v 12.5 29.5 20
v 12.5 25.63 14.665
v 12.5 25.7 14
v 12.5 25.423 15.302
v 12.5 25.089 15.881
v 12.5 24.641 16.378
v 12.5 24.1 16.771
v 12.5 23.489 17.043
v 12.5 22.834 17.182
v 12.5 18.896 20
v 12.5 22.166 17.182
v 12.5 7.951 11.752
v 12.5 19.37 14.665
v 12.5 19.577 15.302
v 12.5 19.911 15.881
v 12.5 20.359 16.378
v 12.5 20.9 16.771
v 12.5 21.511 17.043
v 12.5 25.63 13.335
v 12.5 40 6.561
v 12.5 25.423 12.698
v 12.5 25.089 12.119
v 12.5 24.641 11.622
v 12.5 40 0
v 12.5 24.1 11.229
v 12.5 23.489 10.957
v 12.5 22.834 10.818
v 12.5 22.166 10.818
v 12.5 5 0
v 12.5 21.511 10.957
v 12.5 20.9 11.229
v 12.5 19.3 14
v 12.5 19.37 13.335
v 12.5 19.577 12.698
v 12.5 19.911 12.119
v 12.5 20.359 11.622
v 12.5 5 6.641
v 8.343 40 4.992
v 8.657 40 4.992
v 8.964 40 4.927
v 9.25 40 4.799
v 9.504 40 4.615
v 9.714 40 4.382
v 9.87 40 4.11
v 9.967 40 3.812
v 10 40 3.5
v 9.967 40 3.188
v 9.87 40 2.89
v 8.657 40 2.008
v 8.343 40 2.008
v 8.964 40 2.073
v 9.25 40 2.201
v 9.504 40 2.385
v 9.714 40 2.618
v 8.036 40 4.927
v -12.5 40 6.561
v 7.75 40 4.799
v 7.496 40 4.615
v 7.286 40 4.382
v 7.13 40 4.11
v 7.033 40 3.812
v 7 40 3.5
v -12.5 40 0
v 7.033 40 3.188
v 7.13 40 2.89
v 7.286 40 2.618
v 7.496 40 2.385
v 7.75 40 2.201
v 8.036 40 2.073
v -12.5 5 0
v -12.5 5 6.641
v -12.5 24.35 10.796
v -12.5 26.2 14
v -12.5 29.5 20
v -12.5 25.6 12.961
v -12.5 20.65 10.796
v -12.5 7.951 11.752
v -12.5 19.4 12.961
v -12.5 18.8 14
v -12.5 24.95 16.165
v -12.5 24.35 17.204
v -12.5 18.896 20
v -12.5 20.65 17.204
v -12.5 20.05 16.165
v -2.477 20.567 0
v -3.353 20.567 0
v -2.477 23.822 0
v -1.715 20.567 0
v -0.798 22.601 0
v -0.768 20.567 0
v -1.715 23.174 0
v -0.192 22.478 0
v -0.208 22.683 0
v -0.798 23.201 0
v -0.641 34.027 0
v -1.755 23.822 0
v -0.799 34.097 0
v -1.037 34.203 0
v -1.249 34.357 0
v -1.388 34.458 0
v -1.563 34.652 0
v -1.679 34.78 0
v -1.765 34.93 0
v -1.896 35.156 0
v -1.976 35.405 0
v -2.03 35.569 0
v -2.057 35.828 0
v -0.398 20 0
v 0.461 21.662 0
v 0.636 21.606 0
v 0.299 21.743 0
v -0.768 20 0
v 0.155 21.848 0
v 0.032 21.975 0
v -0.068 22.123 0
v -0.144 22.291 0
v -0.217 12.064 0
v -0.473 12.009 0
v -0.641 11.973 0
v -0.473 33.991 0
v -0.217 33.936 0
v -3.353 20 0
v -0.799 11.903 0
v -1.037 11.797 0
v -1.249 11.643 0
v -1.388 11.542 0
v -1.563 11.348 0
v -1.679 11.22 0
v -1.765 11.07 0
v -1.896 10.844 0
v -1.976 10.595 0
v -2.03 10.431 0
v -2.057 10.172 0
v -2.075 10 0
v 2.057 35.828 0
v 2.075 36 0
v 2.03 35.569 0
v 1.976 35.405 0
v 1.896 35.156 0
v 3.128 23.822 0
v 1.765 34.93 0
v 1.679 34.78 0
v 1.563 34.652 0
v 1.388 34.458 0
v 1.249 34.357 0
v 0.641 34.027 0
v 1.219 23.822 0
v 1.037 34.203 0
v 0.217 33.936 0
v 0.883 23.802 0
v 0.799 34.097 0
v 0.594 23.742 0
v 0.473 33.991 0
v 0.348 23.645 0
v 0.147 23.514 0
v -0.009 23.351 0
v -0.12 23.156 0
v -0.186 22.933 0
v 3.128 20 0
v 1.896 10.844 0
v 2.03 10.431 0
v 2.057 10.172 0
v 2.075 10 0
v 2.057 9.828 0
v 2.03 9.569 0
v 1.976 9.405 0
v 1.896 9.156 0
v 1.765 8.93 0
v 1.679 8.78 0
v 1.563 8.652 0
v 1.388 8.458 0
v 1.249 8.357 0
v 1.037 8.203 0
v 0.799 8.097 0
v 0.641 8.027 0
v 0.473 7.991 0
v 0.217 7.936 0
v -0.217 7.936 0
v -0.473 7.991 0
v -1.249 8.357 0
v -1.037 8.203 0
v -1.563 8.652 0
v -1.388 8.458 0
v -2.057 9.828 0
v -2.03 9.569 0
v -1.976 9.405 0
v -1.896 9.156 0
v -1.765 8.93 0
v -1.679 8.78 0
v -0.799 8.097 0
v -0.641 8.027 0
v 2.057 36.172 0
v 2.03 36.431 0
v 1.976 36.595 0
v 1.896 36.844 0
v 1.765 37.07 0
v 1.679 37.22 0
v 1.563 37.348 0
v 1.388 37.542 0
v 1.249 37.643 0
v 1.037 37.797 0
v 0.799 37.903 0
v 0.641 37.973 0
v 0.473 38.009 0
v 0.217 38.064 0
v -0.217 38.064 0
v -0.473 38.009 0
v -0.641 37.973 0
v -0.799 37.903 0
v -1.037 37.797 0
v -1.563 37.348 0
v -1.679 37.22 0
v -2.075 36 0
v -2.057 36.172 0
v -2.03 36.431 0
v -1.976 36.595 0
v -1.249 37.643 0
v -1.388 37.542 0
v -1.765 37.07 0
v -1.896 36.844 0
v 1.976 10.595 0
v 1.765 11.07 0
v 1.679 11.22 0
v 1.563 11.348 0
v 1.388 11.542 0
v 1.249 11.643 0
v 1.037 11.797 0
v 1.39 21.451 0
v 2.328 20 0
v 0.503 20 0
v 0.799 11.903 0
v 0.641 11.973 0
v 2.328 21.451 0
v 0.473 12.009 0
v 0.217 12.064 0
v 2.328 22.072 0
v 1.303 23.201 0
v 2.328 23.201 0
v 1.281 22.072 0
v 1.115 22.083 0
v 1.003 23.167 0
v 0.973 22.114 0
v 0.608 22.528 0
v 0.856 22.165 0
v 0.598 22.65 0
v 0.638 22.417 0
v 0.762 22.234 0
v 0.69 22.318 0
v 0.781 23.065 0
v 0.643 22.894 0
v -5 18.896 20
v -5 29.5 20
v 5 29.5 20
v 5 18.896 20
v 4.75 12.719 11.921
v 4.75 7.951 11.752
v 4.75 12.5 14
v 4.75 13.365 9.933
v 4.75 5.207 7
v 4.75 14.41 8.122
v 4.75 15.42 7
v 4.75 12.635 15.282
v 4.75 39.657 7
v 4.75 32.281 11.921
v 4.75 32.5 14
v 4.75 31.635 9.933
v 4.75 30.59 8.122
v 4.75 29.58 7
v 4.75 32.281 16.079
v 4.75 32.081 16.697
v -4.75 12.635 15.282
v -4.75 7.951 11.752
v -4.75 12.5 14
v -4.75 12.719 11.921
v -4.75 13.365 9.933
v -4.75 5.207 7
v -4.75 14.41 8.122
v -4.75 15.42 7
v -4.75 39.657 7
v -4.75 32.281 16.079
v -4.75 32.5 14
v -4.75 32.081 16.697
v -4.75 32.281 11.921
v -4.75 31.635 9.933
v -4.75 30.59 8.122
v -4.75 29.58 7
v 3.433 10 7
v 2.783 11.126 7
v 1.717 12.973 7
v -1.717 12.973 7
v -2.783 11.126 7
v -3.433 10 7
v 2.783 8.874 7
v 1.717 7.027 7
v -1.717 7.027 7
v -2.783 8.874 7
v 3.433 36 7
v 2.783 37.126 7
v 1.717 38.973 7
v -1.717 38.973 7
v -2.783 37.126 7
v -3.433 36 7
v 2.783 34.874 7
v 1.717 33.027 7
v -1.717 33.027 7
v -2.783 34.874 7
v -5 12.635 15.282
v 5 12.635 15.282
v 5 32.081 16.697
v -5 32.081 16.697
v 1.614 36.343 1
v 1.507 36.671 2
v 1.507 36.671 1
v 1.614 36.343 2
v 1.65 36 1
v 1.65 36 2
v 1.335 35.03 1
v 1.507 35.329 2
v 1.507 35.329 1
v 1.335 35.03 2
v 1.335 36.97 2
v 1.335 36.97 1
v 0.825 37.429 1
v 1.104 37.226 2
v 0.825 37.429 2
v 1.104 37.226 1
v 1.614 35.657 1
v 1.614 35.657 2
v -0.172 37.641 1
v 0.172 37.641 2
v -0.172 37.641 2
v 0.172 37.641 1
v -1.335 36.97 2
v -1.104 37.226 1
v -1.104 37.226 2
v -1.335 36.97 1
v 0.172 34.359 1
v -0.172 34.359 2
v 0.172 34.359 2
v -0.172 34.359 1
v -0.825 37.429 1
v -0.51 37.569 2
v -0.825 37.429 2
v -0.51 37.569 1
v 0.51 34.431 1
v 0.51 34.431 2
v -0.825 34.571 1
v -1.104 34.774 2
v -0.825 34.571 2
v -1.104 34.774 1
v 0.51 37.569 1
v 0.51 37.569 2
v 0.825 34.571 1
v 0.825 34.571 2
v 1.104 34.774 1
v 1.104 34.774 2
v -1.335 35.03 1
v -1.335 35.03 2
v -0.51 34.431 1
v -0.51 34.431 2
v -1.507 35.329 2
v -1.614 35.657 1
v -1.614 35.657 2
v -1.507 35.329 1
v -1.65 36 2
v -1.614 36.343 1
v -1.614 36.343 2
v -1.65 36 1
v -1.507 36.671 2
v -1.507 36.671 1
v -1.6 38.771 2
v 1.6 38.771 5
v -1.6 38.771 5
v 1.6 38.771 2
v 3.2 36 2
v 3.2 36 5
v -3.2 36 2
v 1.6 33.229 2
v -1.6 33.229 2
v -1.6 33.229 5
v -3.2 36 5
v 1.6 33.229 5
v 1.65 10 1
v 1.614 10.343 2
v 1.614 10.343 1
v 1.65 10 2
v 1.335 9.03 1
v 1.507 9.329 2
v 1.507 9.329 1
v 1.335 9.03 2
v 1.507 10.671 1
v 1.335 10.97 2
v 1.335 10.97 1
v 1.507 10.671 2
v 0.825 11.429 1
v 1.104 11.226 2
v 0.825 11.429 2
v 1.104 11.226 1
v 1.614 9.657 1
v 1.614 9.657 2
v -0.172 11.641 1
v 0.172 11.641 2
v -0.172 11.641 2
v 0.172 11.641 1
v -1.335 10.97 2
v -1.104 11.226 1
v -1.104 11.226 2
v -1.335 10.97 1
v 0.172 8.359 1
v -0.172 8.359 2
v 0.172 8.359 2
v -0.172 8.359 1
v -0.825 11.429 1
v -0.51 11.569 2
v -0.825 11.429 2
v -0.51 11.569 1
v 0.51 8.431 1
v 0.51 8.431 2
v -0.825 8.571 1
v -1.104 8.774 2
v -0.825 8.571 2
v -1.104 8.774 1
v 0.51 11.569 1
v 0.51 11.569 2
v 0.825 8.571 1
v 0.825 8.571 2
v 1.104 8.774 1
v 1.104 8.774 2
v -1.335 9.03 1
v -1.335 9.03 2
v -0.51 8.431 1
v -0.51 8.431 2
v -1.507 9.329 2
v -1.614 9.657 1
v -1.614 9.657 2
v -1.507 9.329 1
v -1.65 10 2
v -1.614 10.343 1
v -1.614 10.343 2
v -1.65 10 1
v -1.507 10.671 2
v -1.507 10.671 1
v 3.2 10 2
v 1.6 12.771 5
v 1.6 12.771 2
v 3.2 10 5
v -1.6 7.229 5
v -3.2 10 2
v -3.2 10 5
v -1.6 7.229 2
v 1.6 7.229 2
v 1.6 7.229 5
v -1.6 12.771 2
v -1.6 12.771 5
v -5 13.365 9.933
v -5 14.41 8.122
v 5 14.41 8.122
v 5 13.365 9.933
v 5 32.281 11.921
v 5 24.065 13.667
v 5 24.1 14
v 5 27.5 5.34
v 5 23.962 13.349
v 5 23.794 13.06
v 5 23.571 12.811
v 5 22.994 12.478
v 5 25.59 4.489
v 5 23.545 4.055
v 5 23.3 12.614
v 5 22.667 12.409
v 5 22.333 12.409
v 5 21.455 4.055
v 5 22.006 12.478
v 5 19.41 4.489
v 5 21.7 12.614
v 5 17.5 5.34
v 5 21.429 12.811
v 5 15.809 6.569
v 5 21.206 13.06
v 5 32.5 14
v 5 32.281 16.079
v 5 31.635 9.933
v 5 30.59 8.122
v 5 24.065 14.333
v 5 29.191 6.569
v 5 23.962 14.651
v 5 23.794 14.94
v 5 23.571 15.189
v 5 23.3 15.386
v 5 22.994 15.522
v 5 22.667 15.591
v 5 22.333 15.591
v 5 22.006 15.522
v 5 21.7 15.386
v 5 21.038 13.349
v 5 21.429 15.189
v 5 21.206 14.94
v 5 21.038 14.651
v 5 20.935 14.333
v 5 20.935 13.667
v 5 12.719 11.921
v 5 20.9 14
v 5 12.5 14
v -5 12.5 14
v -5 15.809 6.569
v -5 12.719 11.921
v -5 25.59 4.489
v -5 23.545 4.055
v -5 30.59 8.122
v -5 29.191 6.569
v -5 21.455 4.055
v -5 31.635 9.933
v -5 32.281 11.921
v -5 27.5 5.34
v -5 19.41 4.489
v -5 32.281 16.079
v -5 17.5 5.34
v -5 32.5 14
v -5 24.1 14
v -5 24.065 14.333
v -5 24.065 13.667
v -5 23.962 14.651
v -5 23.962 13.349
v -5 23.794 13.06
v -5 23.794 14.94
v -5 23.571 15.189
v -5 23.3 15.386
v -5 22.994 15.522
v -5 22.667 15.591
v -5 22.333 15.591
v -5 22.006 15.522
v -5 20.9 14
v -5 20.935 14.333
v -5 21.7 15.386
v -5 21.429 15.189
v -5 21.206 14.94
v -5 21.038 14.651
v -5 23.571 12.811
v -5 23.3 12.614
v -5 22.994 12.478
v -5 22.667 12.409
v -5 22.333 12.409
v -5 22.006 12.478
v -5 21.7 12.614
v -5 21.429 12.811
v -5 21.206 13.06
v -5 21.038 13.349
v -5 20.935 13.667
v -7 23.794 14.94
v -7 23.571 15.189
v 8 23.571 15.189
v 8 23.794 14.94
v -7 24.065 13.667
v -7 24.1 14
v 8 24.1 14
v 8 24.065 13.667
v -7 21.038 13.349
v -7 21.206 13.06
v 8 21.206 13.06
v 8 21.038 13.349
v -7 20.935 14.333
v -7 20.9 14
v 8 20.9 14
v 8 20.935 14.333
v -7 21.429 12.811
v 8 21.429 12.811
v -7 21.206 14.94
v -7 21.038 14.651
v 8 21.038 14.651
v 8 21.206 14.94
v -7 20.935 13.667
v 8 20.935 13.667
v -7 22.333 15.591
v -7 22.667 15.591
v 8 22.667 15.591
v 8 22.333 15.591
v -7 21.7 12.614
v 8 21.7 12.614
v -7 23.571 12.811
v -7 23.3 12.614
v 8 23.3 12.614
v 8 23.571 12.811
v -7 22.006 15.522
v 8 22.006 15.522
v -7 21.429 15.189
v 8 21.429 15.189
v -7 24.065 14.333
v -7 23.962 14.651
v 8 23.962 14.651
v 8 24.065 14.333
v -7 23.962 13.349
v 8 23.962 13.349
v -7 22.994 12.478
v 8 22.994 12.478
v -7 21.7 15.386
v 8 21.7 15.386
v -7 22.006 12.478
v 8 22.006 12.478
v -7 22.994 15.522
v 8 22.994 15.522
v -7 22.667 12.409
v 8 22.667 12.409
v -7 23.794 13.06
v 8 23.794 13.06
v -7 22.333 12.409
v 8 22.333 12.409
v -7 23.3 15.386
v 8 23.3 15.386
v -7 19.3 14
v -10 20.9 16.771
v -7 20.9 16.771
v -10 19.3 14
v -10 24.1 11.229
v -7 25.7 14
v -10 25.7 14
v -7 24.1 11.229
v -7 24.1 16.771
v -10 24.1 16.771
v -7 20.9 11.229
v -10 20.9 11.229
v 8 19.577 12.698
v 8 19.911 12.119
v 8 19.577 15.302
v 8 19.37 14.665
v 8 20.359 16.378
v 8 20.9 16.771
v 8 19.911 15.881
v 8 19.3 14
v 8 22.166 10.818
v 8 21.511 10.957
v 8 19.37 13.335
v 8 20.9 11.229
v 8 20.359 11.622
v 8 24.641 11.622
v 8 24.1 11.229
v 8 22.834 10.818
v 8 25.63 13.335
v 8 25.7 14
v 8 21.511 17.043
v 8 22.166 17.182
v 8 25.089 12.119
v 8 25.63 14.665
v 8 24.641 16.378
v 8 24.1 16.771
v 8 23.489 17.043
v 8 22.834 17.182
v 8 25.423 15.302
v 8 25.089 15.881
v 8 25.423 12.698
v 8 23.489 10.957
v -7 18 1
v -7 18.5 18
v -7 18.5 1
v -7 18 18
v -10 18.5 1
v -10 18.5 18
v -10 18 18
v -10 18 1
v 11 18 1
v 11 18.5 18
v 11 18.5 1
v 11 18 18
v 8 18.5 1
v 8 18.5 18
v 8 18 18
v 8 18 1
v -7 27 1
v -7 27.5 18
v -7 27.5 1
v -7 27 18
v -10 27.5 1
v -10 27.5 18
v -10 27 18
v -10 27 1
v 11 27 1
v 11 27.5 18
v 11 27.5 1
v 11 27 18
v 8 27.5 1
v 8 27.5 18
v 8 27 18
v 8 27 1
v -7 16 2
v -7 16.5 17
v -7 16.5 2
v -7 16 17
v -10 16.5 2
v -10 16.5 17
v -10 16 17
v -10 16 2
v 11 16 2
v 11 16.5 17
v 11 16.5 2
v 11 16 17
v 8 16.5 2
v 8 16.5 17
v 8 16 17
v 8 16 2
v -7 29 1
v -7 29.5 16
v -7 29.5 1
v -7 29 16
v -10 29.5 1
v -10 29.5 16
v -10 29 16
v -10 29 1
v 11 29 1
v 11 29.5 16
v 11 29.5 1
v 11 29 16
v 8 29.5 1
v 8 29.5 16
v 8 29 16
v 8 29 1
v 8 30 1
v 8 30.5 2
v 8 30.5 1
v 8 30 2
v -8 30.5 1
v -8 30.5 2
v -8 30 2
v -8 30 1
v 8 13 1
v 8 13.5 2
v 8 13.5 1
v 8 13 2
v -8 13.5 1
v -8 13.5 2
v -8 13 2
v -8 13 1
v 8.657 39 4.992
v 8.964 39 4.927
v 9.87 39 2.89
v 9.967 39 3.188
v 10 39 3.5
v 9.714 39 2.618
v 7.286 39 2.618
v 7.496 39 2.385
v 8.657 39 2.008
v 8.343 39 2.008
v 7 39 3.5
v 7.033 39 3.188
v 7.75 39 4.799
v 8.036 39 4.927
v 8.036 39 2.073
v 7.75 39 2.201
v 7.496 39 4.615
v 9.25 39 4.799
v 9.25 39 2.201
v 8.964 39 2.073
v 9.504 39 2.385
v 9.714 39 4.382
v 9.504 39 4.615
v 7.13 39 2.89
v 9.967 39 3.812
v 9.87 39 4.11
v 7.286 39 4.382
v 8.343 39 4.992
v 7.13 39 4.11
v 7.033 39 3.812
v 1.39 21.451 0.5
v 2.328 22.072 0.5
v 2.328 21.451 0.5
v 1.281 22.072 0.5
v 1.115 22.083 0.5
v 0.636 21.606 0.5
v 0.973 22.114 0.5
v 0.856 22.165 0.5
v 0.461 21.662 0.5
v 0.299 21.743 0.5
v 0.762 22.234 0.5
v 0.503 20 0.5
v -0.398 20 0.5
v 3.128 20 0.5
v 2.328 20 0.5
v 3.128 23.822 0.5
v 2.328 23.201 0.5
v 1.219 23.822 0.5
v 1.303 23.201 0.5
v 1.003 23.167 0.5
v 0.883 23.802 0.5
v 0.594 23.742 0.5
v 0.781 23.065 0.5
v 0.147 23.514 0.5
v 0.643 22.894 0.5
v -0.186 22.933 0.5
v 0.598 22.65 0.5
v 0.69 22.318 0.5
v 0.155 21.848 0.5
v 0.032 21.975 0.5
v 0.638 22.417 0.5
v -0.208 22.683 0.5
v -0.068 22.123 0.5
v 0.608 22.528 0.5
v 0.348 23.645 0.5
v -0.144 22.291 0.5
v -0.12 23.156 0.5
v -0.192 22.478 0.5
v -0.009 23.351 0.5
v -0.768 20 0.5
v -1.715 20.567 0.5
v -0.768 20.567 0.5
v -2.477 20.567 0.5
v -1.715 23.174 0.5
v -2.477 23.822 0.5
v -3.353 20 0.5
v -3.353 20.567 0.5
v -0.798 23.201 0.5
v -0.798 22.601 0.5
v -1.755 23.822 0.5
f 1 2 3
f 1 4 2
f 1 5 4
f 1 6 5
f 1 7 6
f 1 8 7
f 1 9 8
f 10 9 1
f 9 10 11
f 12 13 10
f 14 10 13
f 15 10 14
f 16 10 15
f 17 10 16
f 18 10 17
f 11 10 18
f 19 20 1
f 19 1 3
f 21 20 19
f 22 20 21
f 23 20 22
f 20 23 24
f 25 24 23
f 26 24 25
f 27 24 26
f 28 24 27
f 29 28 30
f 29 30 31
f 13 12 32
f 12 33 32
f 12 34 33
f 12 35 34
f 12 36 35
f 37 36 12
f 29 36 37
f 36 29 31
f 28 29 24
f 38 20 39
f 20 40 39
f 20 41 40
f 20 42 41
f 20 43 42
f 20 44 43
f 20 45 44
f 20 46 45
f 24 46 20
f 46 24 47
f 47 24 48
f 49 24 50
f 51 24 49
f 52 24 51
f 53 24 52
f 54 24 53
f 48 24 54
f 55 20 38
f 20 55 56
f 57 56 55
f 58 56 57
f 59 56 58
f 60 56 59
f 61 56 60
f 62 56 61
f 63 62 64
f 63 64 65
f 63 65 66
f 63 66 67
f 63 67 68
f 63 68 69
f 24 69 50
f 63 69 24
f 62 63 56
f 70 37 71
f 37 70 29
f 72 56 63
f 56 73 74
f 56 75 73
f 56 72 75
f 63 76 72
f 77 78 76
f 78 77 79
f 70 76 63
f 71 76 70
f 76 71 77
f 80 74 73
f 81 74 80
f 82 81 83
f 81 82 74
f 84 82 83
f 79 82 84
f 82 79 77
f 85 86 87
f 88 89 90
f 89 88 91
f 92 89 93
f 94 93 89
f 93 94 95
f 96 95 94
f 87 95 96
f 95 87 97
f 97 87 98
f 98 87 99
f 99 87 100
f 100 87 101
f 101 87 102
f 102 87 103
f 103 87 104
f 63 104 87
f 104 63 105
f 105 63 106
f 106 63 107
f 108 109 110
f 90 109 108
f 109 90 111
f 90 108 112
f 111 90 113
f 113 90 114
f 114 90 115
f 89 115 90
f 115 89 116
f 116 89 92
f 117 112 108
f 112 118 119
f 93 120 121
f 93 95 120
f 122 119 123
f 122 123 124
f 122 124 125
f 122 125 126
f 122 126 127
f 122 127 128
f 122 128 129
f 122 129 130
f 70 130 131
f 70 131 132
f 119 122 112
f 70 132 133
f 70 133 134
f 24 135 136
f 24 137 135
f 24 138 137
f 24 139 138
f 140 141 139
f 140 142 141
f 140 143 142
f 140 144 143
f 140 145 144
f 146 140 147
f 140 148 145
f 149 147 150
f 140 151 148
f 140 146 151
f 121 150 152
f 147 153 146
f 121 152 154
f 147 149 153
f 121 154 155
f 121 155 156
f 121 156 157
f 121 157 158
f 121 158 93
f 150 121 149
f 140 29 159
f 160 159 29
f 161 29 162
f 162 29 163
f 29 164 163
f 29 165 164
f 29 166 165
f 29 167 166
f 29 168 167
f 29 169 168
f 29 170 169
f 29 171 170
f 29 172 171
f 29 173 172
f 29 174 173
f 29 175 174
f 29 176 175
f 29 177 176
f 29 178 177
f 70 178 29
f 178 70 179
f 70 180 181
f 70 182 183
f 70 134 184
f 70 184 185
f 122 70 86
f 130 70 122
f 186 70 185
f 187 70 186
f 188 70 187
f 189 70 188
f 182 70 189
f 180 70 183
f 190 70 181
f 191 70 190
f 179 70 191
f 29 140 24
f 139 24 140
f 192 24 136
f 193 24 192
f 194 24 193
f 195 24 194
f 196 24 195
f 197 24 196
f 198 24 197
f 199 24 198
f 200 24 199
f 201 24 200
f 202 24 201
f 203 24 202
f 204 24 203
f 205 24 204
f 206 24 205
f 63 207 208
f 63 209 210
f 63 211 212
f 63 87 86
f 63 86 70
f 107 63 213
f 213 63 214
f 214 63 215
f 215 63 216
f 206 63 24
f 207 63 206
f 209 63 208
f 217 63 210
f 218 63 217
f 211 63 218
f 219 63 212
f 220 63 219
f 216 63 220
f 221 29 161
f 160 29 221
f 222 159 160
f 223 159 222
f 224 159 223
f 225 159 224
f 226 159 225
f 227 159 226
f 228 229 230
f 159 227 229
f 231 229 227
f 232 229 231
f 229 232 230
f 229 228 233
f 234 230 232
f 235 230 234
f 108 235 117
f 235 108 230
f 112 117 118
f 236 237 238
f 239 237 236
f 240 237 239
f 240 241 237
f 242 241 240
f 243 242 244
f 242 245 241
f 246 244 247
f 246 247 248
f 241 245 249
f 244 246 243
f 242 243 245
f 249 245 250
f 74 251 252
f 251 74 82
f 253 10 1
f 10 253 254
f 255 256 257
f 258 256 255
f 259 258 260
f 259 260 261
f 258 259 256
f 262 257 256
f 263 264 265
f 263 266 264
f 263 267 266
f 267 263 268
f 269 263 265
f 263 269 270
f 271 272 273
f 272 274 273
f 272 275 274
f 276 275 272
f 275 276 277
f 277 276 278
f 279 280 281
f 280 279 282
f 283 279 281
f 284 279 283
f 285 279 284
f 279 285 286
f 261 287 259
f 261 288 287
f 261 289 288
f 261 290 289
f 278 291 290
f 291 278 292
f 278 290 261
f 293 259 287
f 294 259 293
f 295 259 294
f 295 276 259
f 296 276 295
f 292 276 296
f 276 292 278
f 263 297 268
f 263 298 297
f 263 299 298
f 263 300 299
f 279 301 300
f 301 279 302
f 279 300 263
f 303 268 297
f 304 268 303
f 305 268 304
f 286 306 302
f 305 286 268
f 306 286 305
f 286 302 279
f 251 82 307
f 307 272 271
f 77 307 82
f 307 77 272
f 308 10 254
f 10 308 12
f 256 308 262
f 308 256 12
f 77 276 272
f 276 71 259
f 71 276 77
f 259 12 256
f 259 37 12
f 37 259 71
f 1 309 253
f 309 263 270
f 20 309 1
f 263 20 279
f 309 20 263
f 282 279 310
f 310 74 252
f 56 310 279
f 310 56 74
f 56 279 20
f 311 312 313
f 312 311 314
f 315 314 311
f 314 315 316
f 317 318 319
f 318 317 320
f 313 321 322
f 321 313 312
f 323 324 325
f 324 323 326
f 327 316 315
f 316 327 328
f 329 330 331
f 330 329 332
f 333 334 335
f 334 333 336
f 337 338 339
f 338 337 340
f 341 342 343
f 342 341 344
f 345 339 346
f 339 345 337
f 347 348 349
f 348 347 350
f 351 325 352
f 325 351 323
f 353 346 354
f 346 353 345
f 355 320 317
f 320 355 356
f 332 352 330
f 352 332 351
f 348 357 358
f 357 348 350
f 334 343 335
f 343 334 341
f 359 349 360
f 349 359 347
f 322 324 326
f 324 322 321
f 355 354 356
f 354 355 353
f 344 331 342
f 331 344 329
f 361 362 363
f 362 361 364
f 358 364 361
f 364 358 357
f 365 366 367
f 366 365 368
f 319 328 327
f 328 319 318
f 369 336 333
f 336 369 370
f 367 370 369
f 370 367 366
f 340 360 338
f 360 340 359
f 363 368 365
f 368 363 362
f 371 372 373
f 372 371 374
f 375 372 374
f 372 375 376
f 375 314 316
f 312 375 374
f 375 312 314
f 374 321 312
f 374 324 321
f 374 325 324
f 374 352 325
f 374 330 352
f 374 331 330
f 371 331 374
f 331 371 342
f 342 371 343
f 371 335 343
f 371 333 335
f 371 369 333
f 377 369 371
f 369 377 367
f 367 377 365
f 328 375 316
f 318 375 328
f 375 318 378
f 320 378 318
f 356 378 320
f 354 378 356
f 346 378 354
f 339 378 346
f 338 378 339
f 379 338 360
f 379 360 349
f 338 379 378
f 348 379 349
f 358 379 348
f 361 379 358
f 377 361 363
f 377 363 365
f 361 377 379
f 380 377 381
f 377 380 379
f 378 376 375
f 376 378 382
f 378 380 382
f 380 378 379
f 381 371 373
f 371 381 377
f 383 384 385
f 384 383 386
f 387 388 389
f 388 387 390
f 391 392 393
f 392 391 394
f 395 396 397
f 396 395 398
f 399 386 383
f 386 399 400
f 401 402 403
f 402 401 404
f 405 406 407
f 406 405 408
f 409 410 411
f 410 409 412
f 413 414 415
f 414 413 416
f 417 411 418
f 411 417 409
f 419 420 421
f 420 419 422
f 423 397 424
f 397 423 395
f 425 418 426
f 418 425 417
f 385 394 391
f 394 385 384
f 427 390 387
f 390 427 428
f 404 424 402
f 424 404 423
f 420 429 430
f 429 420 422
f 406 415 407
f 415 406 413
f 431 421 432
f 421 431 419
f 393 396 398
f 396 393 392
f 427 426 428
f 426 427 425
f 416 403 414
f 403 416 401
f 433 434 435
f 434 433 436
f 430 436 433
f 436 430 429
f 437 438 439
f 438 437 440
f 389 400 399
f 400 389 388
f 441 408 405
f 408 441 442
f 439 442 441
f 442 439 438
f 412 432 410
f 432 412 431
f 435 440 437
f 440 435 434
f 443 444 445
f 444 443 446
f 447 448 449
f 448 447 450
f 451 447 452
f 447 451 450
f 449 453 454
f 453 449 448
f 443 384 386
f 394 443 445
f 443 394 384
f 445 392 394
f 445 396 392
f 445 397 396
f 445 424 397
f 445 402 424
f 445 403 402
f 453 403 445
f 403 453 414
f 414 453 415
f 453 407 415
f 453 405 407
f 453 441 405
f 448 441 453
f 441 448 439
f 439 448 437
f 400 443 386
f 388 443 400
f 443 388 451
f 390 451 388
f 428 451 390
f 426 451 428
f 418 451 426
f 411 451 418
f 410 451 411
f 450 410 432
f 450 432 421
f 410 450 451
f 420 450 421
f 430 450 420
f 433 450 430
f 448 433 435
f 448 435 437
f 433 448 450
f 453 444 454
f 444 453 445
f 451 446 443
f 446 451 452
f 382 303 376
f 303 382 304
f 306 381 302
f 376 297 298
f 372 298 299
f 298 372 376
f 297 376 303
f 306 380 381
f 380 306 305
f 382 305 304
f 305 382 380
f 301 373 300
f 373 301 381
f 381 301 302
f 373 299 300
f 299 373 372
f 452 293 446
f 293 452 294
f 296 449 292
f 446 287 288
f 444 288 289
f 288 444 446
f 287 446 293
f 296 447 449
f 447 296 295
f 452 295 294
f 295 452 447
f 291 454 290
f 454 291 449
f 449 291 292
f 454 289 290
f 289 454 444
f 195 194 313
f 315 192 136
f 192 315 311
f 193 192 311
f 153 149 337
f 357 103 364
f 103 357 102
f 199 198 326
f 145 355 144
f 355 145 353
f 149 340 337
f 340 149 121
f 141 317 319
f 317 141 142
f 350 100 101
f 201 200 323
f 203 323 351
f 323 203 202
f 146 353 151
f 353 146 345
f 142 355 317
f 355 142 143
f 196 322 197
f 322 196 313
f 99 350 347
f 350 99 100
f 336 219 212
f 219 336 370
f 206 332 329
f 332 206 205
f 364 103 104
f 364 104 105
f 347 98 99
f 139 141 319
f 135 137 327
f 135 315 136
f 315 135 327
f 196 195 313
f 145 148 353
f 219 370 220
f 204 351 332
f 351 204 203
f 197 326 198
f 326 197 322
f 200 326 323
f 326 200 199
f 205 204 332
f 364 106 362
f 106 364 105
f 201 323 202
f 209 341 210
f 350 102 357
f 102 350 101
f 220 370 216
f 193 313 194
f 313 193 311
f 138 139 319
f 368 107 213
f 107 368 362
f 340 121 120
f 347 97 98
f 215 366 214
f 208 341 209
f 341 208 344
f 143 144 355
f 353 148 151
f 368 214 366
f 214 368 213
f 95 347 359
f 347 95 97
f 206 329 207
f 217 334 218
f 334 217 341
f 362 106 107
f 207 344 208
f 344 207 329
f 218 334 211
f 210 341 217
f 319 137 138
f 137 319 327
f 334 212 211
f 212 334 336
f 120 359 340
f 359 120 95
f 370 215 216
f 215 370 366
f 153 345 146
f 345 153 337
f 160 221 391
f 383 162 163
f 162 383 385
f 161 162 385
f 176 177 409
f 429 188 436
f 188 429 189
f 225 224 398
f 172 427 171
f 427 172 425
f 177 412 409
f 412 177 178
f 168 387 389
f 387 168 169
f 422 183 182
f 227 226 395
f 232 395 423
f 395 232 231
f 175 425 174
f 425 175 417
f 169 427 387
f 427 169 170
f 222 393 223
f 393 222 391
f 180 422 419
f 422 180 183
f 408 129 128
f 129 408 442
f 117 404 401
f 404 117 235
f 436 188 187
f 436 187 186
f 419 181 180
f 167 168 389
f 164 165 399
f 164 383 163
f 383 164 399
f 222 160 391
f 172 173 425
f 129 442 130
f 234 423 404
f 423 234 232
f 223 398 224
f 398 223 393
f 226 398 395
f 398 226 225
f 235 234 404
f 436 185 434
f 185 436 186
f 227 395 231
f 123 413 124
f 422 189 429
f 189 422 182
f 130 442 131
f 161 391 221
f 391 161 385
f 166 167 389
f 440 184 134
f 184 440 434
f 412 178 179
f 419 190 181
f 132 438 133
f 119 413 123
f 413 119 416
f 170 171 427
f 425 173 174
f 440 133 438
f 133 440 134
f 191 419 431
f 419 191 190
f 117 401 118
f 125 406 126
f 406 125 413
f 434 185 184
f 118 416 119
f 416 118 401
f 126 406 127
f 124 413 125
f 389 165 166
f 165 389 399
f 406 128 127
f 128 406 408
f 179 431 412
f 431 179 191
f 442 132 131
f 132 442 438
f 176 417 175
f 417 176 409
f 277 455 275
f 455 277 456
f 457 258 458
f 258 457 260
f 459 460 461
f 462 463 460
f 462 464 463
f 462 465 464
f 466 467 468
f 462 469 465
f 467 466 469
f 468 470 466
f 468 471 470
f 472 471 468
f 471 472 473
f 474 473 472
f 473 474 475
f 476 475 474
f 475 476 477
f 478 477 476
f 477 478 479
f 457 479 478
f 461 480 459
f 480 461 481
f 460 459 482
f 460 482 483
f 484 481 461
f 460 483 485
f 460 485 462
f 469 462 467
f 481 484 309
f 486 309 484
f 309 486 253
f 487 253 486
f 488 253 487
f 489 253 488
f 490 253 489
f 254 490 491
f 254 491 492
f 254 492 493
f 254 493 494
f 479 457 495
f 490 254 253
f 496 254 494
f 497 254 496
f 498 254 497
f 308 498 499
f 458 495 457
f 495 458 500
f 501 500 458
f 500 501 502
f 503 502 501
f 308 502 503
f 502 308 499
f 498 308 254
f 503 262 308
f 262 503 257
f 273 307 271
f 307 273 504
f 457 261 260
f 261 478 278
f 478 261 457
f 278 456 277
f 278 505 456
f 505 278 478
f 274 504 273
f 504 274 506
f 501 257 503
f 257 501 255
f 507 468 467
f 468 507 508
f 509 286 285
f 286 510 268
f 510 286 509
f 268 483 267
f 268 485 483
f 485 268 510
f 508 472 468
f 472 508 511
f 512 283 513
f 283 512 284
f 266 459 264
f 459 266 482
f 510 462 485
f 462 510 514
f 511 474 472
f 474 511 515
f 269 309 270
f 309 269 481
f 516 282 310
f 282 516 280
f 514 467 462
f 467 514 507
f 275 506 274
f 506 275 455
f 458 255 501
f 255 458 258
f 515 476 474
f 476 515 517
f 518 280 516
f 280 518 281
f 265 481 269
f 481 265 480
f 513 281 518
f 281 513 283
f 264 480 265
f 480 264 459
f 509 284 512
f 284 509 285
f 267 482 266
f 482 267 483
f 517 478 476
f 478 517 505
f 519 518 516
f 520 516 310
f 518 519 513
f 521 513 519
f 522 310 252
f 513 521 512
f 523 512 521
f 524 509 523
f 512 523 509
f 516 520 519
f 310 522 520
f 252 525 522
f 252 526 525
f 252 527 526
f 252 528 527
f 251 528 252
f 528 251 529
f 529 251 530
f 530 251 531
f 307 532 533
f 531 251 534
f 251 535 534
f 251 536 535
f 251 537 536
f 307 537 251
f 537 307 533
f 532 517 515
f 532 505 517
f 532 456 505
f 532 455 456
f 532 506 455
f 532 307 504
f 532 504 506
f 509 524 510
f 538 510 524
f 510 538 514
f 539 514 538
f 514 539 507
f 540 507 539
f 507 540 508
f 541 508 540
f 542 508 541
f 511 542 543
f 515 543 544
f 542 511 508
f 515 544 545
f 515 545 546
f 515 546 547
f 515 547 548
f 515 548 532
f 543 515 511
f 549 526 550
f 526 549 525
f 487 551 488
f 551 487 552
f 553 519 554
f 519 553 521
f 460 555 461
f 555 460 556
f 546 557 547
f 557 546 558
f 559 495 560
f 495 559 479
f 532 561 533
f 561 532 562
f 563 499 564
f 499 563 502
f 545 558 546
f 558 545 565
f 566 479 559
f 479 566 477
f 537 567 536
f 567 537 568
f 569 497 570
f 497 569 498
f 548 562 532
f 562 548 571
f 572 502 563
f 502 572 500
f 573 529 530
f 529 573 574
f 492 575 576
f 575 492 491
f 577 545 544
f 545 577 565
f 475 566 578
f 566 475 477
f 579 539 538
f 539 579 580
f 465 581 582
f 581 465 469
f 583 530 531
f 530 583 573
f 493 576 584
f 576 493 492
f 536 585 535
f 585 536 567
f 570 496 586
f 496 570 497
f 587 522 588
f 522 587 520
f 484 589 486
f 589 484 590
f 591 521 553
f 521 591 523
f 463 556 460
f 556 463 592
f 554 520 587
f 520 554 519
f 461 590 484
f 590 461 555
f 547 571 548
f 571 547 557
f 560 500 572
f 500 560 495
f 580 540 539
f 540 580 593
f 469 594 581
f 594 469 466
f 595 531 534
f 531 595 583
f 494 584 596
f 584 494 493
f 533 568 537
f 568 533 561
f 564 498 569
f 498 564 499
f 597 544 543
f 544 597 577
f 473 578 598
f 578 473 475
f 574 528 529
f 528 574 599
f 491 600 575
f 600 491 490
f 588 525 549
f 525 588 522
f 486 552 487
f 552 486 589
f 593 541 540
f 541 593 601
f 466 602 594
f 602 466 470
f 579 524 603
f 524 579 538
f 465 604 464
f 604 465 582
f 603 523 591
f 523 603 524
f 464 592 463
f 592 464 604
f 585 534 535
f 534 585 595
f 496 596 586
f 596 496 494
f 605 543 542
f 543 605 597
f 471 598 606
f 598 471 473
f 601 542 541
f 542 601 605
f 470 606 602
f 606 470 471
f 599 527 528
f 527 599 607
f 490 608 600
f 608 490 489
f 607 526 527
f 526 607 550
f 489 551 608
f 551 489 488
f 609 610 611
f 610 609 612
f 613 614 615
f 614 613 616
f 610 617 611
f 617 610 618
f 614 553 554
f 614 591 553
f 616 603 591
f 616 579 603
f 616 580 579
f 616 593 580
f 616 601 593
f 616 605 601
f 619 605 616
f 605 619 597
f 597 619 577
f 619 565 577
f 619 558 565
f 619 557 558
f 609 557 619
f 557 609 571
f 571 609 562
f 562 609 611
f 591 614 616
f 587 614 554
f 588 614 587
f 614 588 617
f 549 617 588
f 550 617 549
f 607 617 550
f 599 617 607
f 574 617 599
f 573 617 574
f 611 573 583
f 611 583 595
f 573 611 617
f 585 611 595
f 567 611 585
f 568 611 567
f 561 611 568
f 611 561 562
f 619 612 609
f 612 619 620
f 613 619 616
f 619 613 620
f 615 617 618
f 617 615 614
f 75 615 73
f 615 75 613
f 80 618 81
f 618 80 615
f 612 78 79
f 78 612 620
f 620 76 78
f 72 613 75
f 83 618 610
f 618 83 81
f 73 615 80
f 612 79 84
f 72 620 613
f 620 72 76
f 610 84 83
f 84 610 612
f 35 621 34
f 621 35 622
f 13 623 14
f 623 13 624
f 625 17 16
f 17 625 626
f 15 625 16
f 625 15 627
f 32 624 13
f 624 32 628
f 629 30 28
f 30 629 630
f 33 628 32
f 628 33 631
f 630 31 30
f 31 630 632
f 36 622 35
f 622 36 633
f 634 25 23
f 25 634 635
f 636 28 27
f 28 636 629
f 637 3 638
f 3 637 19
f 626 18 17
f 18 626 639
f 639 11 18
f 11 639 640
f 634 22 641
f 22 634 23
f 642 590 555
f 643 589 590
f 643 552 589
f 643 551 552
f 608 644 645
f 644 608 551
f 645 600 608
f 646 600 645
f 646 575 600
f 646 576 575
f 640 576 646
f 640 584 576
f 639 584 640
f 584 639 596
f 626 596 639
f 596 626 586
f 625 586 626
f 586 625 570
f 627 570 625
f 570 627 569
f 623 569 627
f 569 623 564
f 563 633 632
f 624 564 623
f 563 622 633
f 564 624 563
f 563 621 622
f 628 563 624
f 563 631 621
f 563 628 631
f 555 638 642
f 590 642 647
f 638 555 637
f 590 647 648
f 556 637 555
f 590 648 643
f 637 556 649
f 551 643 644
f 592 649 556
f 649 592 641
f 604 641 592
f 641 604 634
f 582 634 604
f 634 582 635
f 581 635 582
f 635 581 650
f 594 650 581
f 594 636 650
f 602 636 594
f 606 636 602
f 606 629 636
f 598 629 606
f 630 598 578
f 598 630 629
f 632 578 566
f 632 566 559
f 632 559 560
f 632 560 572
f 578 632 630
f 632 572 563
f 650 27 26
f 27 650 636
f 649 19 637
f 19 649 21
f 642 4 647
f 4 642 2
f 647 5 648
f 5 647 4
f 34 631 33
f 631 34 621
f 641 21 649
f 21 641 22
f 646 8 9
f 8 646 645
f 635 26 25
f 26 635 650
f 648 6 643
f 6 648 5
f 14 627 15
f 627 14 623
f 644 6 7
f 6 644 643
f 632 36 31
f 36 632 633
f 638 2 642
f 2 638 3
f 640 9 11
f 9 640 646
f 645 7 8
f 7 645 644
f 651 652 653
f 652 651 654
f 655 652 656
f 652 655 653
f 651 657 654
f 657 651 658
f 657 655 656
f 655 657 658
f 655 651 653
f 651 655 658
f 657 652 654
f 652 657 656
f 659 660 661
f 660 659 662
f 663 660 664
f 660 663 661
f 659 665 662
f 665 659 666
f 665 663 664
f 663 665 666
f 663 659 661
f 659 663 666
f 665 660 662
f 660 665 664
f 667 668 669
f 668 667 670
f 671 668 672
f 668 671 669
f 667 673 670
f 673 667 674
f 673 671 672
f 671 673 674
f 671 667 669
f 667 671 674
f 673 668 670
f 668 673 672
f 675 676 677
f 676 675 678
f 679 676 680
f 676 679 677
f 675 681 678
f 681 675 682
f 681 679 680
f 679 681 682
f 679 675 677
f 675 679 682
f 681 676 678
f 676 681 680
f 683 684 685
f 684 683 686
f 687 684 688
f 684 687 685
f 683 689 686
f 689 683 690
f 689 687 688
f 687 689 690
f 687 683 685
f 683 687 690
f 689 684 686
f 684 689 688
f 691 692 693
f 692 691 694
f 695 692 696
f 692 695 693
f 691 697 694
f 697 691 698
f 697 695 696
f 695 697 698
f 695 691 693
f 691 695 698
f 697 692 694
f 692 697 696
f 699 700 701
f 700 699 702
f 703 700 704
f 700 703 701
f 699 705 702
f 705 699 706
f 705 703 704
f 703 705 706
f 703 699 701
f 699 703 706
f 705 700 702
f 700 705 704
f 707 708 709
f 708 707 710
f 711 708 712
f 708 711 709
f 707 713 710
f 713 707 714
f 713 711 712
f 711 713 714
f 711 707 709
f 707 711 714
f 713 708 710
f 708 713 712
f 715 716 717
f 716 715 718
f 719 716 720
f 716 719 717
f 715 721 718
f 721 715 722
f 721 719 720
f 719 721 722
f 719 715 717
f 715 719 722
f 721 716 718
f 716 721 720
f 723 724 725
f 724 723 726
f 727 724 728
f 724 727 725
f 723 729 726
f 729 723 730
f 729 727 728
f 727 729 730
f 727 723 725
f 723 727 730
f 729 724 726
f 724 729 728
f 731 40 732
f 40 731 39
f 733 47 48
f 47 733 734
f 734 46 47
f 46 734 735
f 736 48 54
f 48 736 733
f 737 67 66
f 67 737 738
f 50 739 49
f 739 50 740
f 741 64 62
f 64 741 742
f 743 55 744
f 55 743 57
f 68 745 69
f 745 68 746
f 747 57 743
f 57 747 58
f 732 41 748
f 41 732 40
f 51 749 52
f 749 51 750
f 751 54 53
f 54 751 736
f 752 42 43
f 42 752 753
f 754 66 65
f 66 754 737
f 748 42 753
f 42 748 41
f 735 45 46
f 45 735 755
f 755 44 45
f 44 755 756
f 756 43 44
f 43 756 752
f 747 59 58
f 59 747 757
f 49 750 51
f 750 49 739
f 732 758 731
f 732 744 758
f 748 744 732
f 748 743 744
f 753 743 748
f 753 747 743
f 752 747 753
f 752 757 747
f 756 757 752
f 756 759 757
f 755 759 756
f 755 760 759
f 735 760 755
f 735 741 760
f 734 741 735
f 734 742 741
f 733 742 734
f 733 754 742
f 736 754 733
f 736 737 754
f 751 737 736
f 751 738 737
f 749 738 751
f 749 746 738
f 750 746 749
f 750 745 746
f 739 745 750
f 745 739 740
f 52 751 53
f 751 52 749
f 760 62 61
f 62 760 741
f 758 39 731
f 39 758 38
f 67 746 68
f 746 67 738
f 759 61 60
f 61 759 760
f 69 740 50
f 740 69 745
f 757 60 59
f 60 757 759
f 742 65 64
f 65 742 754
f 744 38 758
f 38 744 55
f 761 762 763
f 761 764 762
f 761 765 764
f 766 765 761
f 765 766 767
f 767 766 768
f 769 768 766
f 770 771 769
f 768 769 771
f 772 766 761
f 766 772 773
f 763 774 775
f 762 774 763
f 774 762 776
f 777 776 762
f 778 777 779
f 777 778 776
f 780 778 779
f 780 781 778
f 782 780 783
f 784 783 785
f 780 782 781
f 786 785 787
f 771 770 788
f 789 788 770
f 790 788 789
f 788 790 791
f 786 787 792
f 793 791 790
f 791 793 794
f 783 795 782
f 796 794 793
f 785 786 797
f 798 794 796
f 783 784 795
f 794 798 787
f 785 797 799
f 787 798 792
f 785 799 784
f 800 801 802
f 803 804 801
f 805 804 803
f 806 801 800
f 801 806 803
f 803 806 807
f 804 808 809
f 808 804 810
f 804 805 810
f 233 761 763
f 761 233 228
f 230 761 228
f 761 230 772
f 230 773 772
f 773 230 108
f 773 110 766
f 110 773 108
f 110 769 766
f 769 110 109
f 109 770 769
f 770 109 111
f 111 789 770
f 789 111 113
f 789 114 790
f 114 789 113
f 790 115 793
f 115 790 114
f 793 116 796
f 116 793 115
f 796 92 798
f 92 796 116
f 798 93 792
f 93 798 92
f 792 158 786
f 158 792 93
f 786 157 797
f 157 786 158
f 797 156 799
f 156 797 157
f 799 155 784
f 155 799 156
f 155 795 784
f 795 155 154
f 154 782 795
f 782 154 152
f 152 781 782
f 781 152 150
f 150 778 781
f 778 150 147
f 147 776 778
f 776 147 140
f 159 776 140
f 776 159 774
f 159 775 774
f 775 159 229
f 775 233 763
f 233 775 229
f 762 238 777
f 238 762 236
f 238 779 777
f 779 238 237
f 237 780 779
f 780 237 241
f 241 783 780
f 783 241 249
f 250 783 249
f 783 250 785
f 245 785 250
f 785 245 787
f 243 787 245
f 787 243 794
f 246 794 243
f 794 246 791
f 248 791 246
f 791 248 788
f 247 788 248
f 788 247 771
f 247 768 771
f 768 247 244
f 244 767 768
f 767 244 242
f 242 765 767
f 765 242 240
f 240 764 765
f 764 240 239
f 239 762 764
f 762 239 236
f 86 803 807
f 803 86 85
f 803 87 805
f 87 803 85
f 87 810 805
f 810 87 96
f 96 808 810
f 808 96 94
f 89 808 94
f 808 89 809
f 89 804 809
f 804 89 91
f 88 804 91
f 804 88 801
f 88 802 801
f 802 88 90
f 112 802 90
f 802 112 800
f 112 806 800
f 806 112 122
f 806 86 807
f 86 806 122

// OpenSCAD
// PRUSA iteration4
// Y belt idler
// GNU GPL v3
// Josef Průša <iam@josefprusa.cz> and contributors
// http://www.reprap.org/wiki/Prusa_Mendel
// http://prusamendel.org

module Y_belt_idler()
{
    difference()
    { 
        // base block
        translate([-12.5,-20,5]) cube([25,20,35]);
        translate([-4.75,-27,-1]) cube([9.5,20,50]); 
        
        // angled front side   
        translate([-15,-19.5,-15]) rotate([37,0,0]) cube([30,20,40]); 
        translate([-15,-12,-15]) rotate([60,0,0]) cube([30,20,40]); 
        translate([-15,-20,29.5]) rotate([38,0,0]) cube([30,20,20]); 

        // screws
        translate([0,1,36]) rotate([90,0,0]) cylinder( h=25, r=1.65, $fn=30 ); 
        translate([0,-2,36]) rotate([90,0,0]) cylinder( h=6, r=3.2 , $fn=6 ); 
        translate([0,1,10]) rotate([90,0,0]) cylinder( h=25, r=1.65, $fn=30 ); 
        translate([0,-2,10]) rotate([90,0,0]) cylinder( h=6, r=3.2 , $fn=6 ); 
        translate([0,-5,36]) rotate([90,0,0]) cylinder( h=6, r=3.2 , r2=3.9, $fn=6 ); 
        translate([0,-5,10]) rotate([90,0,0]) cylinder( h=6, r=3.2 , r2=3.9, $fn=6 );
        translate([0,1,36]) rotate([90,0,0]) cylinder( h=2, r=2.5, r2=1.65,$fn=30 ); 
        translate([0,1,10]) rotate([90,0,0]) cylinder( h=2, r=2.5, r2=1.65,$fn=30 ); 
        
        // pulley cut
        translate([-5,-14,22.5]) rotate([0,90,0]) cylinder( h=10, r=10, $fn=30 ); 
           
        // pulley screw axis 
        translate([-13.5,-14,22.5]) rotate([0,90,0]) cylinder( h=30, r=1.6, $fn=30 ); 
        translate([-14,-14,22.5]) rotate([0,90,0]) cylinder( h=7, r=3.2, $fn=6 ); 
        translate([-14,-14,22.5]) rotate([0,90,0]) cylinder( h=4, r2=3.2, r1=4, $fn=6 ); 
        translate([8,-14,22.5]) rotate([0,90,0]) cylinder( h=6, r=3.2, $fn=30 ); 
        
        // selective infill
        translate([-10,-18,18]) cube([3,17,0.5]);
        translate([8,-18,18]) cube([3,17,0.5]);
        translate([-10,-18,27]) cube([3,17,0.5]);
        translate([8,-18,27]) cube([3,17,0.5]);
        translate([-10,-17,16]) cube([3,15,0.5]);
        translate([8,-17,16]) cube([3,15,0.5]);
        translate([-10,-16,29]) cube([3,15,0.5]);
        translate([8,-16,29]) cube([3,15,0.5]);
        translate([-8,-2,30]) cube([16,1,0.5]);
        translate([-8,-2,13]) cube([16,1,0.5]);
        
        // upper side mark
        translate([8.5,-3.5,39]) rotate([0,0,0]) cylinder( h=2, r=1.5, $fn=30 ); 
        
        //version   
        translate([3.5,-0.5,20]) rotate([90,0,180]) linear_extrude(height = 0.6) 
        { text("R1",font = "helvetica:style=Bold", size=4, center=true); }
    }
    
}   
    
rotate([-90,0,0]) Y_belt_idler(); 
